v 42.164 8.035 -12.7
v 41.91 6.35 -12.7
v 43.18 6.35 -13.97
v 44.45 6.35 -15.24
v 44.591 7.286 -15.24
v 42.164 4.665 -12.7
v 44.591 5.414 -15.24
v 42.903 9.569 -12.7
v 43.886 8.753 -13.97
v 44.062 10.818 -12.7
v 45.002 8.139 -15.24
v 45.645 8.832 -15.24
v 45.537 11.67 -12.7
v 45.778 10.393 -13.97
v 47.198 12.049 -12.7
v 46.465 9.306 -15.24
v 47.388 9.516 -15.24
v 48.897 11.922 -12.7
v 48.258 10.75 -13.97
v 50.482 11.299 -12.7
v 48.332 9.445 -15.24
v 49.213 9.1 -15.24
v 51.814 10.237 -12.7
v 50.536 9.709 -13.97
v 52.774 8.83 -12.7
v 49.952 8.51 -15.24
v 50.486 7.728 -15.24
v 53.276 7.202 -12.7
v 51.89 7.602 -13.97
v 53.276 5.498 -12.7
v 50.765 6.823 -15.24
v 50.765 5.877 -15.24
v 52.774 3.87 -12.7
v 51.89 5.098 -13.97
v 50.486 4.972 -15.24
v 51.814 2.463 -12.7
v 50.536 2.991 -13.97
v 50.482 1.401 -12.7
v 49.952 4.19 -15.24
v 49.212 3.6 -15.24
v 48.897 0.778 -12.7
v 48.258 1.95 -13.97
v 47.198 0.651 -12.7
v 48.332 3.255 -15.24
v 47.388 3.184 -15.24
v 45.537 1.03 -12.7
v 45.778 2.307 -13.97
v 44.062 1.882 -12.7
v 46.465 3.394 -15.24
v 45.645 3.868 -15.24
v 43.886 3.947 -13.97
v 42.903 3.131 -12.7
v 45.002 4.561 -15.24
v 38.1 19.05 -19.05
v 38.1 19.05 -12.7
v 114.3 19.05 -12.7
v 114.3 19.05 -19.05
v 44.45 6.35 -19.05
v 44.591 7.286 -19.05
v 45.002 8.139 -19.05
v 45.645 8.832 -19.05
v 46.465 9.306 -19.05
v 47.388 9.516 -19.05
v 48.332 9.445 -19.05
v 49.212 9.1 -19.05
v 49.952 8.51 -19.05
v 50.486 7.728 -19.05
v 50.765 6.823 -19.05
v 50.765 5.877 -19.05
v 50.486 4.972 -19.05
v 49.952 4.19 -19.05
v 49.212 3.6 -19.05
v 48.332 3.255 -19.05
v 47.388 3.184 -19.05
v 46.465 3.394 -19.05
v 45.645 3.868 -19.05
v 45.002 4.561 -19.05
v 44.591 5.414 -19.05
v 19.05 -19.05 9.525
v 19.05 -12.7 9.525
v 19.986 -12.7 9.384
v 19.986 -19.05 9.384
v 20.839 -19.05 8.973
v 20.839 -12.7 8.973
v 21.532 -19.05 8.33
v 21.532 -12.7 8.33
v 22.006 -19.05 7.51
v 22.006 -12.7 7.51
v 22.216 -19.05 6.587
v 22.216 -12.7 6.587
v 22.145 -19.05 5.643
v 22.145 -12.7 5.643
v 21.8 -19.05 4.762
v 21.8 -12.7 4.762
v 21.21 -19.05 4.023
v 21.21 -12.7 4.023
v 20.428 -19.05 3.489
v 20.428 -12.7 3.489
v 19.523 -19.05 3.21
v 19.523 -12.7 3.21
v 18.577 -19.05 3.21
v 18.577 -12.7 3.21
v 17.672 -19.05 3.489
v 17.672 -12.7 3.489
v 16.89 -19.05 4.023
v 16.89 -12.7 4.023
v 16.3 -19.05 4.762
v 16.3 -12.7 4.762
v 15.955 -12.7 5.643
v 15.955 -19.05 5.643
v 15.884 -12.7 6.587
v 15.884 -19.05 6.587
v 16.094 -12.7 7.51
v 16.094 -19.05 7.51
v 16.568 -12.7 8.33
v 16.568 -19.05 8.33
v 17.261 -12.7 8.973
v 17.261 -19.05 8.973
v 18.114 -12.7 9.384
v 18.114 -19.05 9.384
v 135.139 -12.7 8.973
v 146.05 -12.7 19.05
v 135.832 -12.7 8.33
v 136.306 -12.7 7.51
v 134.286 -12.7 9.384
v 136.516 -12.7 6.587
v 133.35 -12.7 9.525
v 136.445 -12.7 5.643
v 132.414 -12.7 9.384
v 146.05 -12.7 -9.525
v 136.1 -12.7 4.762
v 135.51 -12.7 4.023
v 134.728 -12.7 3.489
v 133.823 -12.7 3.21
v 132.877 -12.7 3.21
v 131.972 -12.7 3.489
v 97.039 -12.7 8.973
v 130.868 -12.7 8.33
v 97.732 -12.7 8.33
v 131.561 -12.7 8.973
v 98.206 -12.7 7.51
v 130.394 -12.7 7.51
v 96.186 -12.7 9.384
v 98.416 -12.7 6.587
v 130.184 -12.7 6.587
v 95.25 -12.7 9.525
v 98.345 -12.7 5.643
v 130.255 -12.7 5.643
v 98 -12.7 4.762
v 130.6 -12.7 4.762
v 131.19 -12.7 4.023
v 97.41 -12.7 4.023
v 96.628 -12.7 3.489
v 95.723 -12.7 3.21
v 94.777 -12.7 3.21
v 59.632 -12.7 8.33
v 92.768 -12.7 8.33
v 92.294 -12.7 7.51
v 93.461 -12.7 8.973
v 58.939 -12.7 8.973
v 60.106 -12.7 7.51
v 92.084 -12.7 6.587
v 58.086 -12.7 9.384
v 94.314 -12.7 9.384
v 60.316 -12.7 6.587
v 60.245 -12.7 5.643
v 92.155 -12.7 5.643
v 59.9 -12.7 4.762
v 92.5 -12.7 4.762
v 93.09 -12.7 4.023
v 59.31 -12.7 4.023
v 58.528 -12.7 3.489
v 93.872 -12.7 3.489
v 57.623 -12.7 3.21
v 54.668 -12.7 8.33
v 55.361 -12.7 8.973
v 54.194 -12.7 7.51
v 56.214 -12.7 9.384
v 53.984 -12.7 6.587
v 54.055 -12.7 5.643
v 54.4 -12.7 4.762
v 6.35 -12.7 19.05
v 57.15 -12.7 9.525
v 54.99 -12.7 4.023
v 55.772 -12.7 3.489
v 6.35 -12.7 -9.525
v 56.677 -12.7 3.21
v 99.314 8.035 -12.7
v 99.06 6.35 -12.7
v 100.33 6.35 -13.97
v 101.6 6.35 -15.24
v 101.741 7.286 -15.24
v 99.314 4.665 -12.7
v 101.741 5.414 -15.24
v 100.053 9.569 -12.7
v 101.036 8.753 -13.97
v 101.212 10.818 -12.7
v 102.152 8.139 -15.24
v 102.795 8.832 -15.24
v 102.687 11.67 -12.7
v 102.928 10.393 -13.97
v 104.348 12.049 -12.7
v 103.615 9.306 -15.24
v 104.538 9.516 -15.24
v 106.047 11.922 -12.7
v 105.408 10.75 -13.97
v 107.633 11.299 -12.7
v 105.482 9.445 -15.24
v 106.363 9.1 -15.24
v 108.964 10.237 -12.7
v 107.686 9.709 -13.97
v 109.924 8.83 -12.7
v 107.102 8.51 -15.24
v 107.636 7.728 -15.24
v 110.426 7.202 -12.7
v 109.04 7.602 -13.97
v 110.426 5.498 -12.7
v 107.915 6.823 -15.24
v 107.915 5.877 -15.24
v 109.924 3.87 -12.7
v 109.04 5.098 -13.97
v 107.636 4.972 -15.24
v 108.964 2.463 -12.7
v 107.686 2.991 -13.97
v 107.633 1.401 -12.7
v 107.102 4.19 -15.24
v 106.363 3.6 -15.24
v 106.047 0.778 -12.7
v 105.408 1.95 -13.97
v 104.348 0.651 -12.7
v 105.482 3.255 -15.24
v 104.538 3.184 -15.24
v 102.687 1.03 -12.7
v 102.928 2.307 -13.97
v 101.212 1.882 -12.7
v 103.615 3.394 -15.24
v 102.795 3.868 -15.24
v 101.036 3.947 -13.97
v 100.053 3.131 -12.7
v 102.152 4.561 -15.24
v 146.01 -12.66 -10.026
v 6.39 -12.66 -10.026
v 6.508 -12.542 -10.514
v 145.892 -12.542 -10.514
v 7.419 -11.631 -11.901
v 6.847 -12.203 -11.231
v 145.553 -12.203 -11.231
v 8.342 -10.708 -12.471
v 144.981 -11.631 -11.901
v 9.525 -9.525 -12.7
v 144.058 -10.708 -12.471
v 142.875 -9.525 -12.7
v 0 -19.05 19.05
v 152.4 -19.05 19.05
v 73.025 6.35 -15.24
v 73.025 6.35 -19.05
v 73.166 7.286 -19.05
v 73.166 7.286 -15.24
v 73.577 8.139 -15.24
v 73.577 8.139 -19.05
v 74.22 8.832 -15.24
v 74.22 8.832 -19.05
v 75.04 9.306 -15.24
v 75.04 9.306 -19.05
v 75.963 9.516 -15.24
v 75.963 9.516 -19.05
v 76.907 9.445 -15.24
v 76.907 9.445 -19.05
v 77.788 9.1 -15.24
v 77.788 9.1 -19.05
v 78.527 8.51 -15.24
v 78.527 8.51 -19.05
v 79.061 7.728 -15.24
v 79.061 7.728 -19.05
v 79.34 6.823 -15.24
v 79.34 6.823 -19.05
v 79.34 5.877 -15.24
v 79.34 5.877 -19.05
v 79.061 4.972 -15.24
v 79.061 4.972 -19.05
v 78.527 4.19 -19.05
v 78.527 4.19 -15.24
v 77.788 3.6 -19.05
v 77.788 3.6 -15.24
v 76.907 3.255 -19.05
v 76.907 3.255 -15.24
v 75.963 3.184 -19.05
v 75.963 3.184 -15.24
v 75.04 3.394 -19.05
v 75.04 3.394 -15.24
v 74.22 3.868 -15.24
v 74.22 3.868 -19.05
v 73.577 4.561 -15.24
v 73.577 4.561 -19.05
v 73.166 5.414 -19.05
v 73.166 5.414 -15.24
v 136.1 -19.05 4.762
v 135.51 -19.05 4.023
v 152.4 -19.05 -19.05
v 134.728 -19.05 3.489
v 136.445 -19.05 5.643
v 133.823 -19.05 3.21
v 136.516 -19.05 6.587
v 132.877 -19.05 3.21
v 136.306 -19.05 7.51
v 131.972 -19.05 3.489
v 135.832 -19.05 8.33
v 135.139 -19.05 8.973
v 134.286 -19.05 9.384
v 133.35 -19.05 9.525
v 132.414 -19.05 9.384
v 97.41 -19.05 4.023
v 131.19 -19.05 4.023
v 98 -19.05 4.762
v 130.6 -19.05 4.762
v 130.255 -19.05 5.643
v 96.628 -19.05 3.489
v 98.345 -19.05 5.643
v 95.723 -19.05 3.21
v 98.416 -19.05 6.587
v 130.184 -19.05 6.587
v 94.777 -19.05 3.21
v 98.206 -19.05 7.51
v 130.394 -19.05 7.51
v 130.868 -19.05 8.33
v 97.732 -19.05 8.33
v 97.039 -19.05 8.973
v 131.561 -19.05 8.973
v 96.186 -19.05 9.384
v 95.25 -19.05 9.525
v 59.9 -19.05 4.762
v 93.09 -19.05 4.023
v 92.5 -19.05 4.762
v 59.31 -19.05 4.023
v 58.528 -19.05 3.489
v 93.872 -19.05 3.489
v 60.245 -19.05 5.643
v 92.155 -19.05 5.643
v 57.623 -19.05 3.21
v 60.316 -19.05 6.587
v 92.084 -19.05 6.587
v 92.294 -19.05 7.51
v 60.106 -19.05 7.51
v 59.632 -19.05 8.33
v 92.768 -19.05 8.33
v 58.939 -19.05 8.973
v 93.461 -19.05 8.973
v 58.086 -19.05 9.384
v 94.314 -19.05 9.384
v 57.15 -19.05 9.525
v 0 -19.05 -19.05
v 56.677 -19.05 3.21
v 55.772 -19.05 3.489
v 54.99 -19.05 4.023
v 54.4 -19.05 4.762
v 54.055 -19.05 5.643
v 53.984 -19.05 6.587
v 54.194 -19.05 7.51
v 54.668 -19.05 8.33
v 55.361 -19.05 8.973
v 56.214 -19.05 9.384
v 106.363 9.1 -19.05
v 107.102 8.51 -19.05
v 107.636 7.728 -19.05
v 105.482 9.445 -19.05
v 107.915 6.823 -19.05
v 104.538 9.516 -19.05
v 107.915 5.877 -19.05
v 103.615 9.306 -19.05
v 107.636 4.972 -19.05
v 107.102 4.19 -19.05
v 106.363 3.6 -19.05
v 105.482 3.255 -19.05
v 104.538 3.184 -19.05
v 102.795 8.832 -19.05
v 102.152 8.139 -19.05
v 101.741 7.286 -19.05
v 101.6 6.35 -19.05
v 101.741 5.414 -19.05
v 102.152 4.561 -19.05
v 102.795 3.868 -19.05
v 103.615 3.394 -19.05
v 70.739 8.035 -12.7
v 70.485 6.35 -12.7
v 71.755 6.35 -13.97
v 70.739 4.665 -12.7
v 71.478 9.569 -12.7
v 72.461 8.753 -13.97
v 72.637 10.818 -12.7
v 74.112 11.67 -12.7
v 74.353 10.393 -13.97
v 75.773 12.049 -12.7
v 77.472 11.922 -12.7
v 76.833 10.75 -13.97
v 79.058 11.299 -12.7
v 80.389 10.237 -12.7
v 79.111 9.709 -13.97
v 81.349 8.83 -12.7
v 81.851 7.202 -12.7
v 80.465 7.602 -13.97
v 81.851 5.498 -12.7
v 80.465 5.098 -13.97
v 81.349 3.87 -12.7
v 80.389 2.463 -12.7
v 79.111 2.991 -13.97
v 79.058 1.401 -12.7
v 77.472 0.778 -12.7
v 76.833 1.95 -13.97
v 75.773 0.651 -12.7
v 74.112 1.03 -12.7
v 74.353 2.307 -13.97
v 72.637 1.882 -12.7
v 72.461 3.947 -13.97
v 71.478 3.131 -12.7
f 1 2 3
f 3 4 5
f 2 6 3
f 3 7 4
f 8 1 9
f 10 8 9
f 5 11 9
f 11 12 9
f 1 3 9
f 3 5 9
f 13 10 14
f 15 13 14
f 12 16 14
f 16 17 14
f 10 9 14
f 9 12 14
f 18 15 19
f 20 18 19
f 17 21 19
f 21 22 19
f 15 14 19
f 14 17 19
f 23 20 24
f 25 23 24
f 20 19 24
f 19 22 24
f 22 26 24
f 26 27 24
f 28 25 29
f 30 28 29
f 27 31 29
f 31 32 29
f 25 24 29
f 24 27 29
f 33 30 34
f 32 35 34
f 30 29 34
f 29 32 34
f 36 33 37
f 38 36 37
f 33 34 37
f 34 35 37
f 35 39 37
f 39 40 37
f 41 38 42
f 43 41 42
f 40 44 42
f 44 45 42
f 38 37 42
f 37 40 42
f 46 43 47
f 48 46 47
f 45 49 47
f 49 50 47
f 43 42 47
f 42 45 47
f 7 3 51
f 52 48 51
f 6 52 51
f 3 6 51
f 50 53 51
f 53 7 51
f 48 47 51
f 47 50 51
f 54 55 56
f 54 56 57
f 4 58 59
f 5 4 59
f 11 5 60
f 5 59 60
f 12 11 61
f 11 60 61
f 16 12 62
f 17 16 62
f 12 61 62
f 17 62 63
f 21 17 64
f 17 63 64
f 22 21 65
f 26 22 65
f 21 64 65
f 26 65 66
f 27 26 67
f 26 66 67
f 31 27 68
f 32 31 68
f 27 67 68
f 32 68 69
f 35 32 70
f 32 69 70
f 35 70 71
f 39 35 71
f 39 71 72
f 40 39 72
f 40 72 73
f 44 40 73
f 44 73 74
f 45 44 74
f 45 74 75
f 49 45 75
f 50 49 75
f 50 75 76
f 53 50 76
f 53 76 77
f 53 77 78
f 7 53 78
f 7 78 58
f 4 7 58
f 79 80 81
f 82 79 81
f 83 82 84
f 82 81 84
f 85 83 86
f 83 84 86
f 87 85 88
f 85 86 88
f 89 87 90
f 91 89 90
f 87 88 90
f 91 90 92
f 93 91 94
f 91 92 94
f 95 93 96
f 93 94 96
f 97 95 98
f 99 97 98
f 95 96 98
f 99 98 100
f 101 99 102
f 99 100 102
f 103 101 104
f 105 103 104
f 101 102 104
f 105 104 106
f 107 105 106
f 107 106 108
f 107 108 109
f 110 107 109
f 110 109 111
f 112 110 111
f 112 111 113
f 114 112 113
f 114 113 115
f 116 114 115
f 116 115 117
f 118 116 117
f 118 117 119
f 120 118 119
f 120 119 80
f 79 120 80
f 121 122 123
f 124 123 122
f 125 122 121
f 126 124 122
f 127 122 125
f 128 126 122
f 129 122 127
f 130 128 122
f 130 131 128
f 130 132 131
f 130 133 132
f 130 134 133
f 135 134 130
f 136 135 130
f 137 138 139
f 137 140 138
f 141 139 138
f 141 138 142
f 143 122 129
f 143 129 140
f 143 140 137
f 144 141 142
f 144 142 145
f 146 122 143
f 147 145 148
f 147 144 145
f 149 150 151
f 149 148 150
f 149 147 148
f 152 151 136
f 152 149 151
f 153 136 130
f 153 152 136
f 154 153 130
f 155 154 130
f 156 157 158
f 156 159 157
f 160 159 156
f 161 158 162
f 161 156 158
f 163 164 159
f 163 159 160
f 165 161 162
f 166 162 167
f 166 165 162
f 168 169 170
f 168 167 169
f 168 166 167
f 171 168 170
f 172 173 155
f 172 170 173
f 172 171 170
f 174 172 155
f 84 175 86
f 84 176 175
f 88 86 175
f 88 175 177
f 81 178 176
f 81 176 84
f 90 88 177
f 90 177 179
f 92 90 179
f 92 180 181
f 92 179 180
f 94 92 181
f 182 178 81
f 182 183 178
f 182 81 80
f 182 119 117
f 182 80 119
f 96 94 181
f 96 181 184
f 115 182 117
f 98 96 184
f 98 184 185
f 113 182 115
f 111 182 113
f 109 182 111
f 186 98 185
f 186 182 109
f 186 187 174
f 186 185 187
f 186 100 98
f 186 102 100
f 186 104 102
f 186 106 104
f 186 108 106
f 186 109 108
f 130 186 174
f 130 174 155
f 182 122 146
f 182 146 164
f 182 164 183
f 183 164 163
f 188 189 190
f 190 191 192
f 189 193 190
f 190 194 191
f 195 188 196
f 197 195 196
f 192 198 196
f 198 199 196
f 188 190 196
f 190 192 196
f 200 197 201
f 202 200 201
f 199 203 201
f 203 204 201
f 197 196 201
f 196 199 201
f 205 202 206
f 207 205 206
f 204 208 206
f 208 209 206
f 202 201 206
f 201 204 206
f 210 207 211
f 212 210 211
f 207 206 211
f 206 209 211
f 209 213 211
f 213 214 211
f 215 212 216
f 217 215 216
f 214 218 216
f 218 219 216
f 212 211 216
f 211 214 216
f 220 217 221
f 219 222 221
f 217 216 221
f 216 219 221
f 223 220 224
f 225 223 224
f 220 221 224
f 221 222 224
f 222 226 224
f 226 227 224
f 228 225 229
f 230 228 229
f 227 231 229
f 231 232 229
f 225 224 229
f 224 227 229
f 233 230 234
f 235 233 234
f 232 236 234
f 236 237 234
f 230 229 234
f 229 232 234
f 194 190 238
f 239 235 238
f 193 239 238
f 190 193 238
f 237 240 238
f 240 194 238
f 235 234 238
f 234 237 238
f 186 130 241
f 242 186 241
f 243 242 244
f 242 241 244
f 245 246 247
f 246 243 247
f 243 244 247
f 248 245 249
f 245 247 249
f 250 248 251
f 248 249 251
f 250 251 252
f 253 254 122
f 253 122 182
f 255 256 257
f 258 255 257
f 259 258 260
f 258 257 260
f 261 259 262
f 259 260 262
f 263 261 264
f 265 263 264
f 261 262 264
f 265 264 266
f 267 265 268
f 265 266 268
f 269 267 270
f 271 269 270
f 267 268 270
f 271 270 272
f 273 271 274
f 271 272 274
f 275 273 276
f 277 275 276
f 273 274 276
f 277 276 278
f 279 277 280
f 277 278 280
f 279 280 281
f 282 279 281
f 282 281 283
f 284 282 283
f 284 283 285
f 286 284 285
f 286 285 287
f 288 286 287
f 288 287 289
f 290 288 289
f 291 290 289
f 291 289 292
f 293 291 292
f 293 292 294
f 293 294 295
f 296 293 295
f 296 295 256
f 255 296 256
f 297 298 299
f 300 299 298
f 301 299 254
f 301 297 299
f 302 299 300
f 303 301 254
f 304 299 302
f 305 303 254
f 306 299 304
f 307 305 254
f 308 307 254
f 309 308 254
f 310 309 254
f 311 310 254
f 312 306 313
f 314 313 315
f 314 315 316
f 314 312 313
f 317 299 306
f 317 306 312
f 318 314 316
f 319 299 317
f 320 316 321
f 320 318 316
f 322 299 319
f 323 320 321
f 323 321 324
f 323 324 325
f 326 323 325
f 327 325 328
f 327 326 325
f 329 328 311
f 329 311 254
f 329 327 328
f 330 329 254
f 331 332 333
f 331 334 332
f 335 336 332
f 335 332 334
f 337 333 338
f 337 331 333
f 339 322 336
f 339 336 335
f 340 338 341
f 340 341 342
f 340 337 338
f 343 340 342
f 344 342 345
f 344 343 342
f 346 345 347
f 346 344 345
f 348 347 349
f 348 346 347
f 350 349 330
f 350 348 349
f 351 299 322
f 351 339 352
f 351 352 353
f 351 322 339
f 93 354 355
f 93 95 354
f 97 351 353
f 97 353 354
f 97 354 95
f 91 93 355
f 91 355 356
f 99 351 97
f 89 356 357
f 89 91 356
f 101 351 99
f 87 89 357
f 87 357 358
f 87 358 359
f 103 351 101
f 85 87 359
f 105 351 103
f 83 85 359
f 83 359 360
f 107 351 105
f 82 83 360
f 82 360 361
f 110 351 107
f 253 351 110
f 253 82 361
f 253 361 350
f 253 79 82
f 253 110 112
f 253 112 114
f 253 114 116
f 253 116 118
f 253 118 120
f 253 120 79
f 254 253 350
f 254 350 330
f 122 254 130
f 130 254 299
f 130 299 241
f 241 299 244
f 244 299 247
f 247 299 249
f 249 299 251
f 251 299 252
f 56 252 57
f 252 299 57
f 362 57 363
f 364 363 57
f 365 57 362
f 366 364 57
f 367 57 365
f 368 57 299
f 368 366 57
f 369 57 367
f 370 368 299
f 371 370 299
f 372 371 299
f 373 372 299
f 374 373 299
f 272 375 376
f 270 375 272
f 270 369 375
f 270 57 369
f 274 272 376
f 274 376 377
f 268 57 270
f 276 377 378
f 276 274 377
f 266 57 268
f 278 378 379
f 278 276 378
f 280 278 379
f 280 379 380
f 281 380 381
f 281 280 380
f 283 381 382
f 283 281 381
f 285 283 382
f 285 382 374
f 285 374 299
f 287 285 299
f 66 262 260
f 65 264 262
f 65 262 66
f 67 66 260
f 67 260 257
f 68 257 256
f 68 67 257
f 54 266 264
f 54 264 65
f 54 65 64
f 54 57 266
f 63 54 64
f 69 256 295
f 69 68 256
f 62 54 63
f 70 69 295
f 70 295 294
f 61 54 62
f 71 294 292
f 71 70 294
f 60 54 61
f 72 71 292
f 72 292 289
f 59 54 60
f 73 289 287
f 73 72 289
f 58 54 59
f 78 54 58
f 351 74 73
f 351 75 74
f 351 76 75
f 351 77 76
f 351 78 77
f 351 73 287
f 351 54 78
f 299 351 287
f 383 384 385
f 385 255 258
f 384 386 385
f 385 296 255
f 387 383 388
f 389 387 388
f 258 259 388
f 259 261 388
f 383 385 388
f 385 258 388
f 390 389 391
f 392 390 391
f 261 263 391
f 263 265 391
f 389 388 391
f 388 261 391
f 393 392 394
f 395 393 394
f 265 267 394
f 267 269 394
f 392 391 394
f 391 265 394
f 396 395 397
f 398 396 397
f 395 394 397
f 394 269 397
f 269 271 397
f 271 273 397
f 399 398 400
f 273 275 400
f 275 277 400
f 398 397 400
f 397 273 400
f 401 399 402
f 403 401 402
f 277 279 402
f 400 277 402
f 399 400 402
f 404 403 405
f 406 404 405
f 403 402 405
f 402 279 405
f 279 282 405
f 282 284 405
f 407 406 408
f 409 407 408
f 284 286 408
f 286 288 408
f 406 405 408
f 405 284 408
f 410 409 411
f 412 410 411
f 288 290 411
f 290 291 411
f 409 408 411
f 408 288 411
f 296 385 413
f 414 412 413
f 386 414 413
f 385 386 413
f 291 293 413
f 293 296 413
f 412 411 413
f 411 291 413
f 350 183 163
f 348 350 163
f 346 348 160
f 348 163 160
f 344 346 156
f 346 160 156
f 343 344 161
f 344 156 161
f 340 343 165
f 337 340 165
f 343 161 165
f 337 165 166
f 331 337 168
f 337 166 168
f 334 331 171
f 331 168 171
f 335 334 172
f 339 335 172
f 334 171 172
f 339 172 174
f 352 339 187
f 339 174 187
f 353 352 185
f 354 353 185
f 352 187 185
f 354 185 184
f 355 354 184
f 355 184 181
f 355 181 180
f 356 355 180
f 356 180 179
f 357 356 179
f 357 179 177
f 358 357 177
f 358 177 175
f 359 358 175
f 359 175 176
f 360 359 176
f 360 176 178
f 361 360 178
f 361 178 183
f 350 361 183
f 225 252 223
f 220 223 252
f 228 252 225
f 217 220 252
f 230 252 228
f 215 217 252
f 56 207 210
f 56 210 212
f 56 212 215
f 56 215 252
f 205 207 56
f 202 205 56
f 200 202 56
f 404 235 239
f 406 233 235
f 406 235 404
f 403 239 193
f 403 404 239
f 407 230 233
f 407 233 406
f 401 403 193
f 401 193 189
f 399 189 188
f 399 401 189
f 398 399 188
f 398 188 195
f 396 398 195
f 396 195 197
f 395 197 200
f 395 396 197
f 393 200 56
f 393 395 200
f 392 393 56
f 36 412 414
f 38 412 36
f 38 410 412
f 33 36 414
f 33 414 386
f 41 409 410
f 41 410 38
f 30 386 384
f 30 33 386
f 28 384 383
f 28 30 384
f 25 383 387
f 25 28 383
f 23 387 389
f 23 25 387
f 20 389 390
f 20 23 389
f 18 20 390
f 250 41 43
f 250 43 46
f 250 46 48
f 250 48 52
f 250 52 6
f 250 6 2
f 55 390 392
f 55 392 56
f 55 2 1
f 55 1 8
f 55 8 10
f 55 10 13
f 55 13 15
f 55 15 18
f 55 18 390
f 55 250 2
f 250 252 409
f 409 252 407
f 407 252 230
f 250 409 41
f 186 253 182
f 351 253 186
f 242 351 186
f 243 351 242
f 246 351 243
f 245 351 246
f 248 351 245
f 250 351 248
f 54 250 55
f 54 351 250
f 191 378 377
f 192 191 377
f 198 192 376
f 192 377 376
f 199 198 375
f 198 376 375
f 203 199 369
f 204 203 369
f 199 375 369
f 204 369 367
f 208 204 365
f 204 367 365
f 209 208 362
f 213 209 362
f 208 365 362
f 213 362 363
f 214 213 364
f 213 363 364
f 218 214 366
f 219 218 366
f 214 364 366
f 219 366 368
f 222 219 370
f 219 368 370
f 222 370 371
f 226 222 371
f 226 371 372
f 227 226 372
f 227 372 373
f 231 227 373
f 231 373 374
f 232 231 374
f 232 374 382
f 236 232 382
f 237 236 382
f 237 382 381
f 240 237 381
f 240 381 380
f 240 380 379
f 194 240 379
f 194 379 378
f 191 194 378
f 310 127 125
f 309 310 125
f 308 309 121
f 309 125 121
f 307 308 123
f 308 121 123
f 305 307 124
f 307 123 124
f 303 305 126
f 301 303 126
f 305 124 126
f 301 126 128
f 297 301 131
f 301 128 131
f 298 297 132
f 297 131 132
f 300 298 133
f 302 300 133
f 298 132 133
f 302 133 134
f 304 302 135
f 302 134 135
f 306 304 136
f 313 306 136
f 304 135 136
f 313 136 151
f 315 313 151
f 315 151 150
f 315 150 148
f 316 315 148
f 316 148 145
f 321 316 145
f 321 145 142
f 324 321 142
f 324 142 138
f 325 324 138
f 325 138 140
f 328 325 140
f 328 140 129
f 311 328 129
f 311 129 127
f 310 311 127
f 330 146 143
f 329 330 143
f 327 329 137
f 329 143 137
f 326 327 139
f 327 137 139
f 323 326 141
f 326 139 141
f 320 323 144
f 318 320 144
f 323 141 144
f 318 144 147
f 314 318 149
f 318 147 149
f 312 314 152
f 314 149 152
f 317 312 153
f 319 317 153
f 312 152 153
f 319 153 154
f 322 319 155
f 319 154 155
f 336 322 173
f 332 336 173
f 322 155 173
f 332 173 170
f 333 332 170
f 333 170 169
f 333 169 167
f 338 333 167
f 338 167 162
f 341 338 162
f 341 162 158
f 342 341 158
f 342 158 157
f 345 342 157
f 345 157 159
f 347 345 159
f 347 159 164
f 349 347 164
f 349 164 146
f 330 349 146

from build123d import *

# Parameters (mm, degrees)
BOSS_EXTRUDE1_DEPTH = 152.4
FILLET1_R           = 3.175
SKETCH2_R           = 3.175
CUT_EXTRUDE2_DEPTH  = 152.4
CHAMFER1_SIZE       = 2.54
CHAMFER2_SIZE       = 2.54
SKETCH3_R           = 3.175
CUT_EXTRUDE3_DEPTH  = 152.4
CUT_EXTRUDE4_DEPTH  = 152.4


with BuildPart() as part:
    # Sketch1 → Boss-Extrude1 (new body)
    with BuildSketch(Plane(origin=(0, 0, 0), x_dir=(0, 0, -1), z_dir=(1, 0, 0))):
        Polygon((19.05, -19.05), (-19.05, -19.05), (-19.05, -12.7), (12.7, -12.7), (12.7, 19.05), (19.05, 19.05), align=None)
    extrude(amount=BOSS_EXTRUDE1_DEPTH)

    # Fillet1
    fillet1_edges = [part.edges().sort_by_distance(p)[0] for p in [
        (76.2, -12.7, -12.7),
    ]]
    fillet(fillet1_edges, radius=FILLET1_R)

    # Sketch2 → Cut-Extrude2 (cut)
    with BuildSketch(Plane(origin=(0, 0, -19.05), x_dir=(-1, 0, 0), z_dir=(0, 0, -1))):
        with Locations((-104.775, 6.35)):
            Circle(SKETCH2_R)
        with Locations((-76.2, 6.35)):
            Circle(SKETCH2_R)
        with Locations((-47.625, 6.35)):
            Circle(SKETCH2_R)
    extrude(amount=-CUT_EXTRUDE2_DEPTH, mode=Mode.SUBTRACT)

    # Chamfer1
    chamfer1_edges = [part.edges().sort_by_distance(p)[0] for p in [
        (50.8, 6.35, -12.7),
    ]]
    chamfer(chamfer1_edges, length=CHAMFER1_SIZE)

    # Chamfer2
    chamfer2_edges = [part.edges().sort_by_distance(p)[0] for p in [
        (107.95, 6.35, -12.7),
        (79.375, 6.35, -12.7),
    ]]
    chamfer(chamfer2_edges, length=CHAMFER2_SIZE)

    # Sketch3 → Cut-Extrude3 (cut)
    with BuildSketch(Plane(origin=(0, -12.7, 0), x_dir=(1, 0, 0), z_dir=(0, 1, 0))):
        with Locations(Location((19.05, -6.35, 0), (0, 0, 270))):
            Circle(SKETCH3_R)
        with Locations(Location((57.15, -6.35, 0), (0, 0, 270))):
            Circle(SKETCH3_R)
        with Locations(Location((95.25, -6.35, 0), (0, 0, 270))):
            Circle(SKETCH3_R)
        with Locations(Location((133.35, -6.35, 0), (0, 0, 270))):
            Circle(SKETCH3_R)
    extrude(amount=-CUT_EXTRUDE3_DEPTH, mode=Mode.SUBTRACT)

    # Sketch4 → Cut-Extrude4 (cut)
    with BuildSketch(Plane(origin=(0, 0, -19.05), x_dir=(-1, 0, 0), z_dir=(0, 0, -1))):
        Polygon((-152.4, -19.05), (-114.3, 19.05), (-152.4, 19.05), align=None)
        Polygon((0, -19.05), (-38.1, 19.05), (0, 19.05), align=None)
    extrude(amount=-CUT_EXTRUDE4_DEPTH, mode=Mode.SUBTRACT)


solid = part.part
